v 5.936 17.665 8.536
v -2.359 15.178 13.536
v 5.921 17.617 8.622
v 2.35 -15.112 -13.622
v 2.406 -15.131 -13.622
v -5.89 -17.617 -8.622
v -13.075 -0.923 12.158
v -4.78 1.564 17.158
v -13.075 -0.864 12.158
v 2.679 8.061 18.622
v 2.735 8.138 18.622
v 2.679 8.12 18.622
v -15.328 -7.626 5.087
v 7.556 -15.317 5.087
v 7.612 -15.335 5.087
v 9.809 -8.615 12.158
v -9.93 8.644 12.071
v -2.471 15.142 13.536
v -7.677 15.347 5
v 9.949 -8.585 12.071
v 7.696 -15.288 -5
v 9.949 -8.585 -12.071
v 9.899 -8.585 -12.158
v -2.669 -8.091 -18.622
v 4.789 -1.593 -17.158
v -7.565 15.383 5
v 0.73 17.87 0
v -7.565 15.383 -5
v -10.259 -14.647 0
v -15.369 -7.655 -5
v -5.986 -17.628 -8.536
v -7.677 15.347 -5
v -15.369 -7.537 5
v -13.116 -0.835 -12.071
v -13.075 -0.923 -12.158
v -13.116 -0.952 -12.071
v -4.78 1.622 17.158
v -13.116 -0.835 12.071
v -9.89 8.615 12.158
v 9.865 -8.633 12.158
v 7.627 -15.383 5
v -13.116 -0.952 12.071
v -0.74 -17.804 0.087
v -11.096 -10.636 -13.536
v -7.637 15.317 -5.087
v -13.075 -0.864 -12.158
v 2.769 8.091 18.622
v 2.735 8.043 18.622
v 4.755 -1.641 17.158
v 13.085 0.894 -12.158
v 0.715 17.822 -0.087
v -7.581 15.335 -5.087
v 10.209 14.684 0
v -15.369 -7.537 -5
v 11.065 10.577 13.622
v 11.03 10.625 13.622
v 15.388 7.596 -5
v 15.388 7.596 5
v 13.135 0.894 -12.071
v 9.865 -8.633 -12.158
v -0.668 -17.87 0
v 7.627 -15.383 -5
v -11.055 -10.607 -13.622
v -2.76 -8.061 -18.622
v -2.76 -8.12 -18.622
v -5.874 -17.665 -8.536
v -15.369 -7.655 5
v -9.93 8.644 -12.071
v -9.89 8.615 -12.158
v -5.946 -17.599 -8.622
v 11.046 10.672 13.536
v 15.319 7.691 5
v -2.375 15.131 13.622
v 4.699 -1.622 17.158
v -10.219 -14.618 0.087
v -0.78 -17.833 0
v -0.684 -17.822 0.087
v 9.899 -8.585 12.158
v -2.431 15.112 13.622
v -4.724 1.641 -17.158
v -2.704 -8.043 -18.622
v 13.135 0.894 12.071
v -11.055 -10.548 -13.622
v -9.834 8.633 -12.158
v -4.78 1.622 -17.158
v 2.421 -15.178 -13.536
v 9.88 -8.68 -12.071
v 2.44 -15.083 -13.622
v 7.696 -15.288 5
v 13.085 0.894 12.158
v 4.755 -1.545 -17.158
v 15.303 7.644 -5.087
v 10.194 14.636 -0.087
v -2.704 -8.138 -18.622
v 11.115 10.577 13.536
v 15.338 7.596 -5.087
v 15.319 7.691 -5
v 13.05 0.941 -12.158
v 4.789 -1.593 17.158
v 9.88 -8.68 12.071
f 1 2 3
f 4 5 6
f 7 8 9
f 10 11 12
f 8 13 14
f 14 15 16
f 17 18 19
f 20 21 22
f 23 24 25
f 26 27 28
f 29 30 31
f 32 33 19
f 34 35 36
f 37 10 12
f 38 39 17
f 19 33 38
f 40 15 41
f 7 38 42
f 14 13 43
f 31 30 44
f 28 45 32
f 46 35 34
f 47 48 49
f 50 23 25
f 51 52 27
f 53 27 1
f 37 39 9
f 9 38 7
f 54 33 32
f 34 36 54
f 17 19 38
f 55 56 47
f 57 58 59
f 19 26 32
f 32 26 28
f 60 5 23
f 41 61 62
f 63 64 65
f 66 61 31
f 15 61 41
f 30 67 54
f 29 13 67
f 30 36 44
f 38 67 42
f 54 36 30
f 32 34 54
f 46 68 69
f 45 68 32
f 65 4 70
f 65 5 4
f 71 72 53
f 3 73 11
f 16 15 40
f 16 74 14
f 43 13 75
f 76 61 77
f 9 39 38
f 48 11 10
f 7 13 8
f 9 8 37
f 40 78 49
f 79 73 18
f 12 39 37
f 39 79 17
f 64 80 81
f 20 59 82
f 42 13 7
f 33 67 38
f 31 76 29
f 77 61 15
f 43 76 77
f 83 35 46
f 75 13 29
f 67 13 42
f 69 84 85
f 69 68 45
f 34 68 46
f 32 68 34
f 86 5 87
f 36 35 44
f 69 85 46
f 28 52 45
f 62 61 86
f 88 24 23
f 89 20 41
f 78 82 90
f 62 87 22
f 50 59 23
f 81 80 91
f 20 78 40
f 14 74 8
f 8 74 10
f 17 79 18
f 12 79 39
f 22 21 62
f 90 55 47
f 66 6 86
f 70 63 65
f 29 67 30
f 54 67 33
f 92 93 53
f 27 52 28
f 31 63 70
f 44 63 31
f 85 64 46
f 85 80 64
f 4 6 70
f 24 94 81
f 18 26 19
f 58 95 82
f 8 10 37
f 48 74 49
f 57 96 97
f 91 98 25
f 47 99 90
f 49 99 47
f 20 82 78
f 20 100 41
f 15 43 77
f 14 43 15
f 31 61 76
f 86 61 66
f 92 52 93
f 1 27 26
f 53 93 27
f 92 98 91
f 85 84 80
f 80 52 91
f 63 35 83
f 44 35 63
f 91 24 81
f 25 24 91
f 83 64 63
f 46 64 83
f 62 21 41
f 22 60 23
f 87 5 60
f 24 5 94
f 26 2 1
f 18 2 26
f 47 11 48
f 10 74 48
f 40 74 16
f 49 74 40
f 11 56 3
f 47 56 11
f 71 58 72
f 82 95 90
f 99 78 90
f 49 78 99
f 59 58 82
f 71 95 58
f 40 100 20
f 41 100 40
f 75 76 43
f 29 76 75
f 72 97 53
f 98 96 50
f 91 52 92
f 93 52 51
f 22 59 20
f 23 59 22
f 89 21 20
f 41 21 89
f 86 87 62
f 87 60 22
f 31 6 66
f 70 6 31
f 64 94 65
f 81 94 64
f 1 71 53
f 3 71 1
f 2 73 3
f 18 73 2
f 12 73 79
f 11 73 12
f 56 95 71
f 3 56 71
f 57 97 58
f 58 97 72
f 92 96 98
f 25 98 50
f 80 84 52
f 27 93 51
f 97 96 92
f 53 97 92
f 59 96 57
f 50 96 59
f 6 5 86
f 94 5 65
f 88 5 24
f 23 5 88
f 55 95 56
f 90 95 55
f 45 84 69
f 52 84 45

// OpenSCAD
// Auto-generated OpenSCAD file

    inner_points = 10*[[-0.9849058201924669, 0.8585262410125142, 1.2071067811863656], [-1.528785757453395, -0.759623373893002, -0.49999999999996925], [-0.7596233738762859, 1.5287857574549684, 0.4999999999997299], [-1.3035033111372138, -0.08936385745054792, -1.207106781186605], [1.3035033111553536, 0.08936385743535108, 1.207106781186605], [0.7596233738944258, -1.528785757470165, -0.4999999999997299], [1.5287857574715347, 0.7596233738778053, 0.49999999999996925], [0.9849058202106068, -0.8585262410277109, -1.2071067811863656], [-1.3035033111373446, -0.08936385745018655, 1.2071067811864902], [-1.5287857574534491, -0.7596233738928524, 0.5000000000000306], [-0.7596233738762316, 1.5287857574548187, -0.50000000000027], [-0.9849058201923361, 0.8585262410121528, -1.2071067811867295], [0.984905820210476, -0.8585262410273495, 1.2071067811867295], [0.7596233738943715, -1.5287857574700154, 0.50000000000027], [1.5287857574715888, 0.7596233738776557, -0.5000000000000306], [1.3035033111554843, 0.0893638574349897, -1.2071067811864902], [-0.4739450492223731, 0.159298745465096, 1.707106781186498], [-1.0178249864833009, -1.4588508694404203, 1.6314155227994063e-13], [0.06993488803873991, 1.7774483603701012, -2.6229591075641936e-13], [-0.4739450492221878, 0.15929874546458486, -1.707106781186597], [0.4739450492403277, -0.1592987454797817, 1.707106781186597], [-0.06993488802060001, -1.777448360385298, 2.6229591075641936e-13], [1.0178249865014406, 1.4588508694252236, -1.6314155227994063e-13], [0.47394504924051306, -0.15929874548029285, -1.707106781186498], [-0.23902080233061446, 1.5083023029927278, 1.353553390593035], [-1.1014982305363656, -1.0577374103756392, -1.3535533905931754], [1.1014982305545054, 1.0577374103604424, 1.3535533905931754], [0.2390208023487544, -1.5083023030079246, -1.353553390593035], [0.27193996863947956, 0.8090748074453095, 1.8535533905931674], [-0.5905374595662716, -1.7569649059230572, -0.8535533905930429], [0.5905374595844115, 1.7569649059078605, 0.8535533905930429], [-0.2719399686213396, -0.8090748074605062, -1.8535533905931674]];

    outer_points = 10*[[-0.8446900511180744, 1.3030414766726957, -0.867637706641361], [-1.5597798480580507, -0.8536041736719377, -0.05157812186332089], [-0.25595636104042685, 0.8536041736719377, -1.5394998597940455], [-0.9710461579804031, -1.3030414766726957, -0.7234402750160054], [0.9710461579804031, 1.3030414766726957, 0.7234402750160054], [0.25595636104042685, -0.8536041736719377, 1.5394998597940455], [1.5597798480580507, 0.8536041736719377, 0.05157812186332089], [0.8446900511180744, -1.3030414766726957, 0.867637706641361], [-1.470432588051366, 0.9891747549732535, -0.15354110359529327], [-1.7666324802585267, 0.0958628773675625, 0.18448184412432744], [-0.04910372883995073, -0.0958628773675625, -1.7755598257816938], [-0.34530362104711143, -0.9891747549732535, -1.437536878062073], [0.34530362104711143, 0.9891747549732535, 1.437536878062073], [0.04910372883995073, 0.0958628773675625, 1.7755598257816938], [1.7666324802585267, -0.0958628773675625, -0.18448184412432744], [1.470432588051366, -0.9891747549732535, 0.15354110359529327], [-0.7291708128859692, 1.6208416413427247, 0.07345652930633434], [-1.4442606098259454, -0.5358040090019087, 0.8895161140843744], [0.692158046325446, 0.5358040090019087, -1.5485621928800661], [-0.022931750614530233, -1.6208416413427247, -0.732502608102026], [0.022931750614530233, 1.6208416413427247, 0.732502608102026], [-0.692158046325446, -0.5358040090019087, 1.5485621928800661], [1.4442606098259454, 0.5358040090019087, -0.8895161140843744], [0.7291708128859692, -1.6208416413427247, -0.07345652930633434], [0.03517302803740674, 1.7099897115417881, -1.113064062349067], [-1.098806673635385, -1.7099897115417881, 0.18103215948739226], [1.098806673635385, 1.7099897115417881, -0.18103215948739226], [-0.03517302803740674, -1.7099897115417881, 1.113064062349067], [0.15069226626951202, 2.027789876211817, -0.17196982640137165], [-0.9832874354032798, -1.392189546871759, 1.122126395435088], [0.9832874354032798, 1.392189546871759, -1.122126395435088], [-0.15069226626951202, -2.027789876211817, 0.17196982640137165]];

    // Convex hull for inner set (I)
    module inner_hull() {
        hull() {
            for (p = inner_points) {
                translate(p) sphere(r=0.1);
            }
        }
    }

    // Convex hull for outer set (O) minus inner hull (O \ I)
    module outer_minus_inner() {
        difference() {
            hull() {
                for (p = outer_points) {
                    translate(p) sphere(r=0.1);
                }
            }
            inner_hull(); // Subtract inner hull
        }
    }

    // Convex hull for outer set (O) minus all translated inner hulls
    module outer_minus_AllTranslationInner() {
        difference() {
            hull() {
                for (p = outer_points) {
                    translate(p) sphere(r=0.1);
                }
            }
            hull() {
                translate([0,0,50]) inner_hull();
                translate([0,0,-50]) inner_hull();
            }; // Subtract translated inner hulls
        }
    }

    // Difference between outer_minus_inner and outer_minus_AllTranslationInner
    module outer_minus_inner_diff() {
        difference() {
            // Outer minus inner
            difference() {
                hull() {
                    for (p = outer_points) {
                        translate(p) sphere(r=0.1);
                    }
                }
                inner_hull();
            }

            // Subtract Outer minus AllTranslationInner
            difference() {
                hull() {
                    for (p = outer_points) {
                        translate(p) sphere(r=0.1);
                    }
                }
                hull() {
                    translate([0,0,50]) inner_hull();
                    translate([0,0,-50]) inner_hull();
                };
            }
        }
    }

    // Rendering all with colors applied
    color([1, 0, 0, 0.5]) inner_hull(); // Transparent red
    
